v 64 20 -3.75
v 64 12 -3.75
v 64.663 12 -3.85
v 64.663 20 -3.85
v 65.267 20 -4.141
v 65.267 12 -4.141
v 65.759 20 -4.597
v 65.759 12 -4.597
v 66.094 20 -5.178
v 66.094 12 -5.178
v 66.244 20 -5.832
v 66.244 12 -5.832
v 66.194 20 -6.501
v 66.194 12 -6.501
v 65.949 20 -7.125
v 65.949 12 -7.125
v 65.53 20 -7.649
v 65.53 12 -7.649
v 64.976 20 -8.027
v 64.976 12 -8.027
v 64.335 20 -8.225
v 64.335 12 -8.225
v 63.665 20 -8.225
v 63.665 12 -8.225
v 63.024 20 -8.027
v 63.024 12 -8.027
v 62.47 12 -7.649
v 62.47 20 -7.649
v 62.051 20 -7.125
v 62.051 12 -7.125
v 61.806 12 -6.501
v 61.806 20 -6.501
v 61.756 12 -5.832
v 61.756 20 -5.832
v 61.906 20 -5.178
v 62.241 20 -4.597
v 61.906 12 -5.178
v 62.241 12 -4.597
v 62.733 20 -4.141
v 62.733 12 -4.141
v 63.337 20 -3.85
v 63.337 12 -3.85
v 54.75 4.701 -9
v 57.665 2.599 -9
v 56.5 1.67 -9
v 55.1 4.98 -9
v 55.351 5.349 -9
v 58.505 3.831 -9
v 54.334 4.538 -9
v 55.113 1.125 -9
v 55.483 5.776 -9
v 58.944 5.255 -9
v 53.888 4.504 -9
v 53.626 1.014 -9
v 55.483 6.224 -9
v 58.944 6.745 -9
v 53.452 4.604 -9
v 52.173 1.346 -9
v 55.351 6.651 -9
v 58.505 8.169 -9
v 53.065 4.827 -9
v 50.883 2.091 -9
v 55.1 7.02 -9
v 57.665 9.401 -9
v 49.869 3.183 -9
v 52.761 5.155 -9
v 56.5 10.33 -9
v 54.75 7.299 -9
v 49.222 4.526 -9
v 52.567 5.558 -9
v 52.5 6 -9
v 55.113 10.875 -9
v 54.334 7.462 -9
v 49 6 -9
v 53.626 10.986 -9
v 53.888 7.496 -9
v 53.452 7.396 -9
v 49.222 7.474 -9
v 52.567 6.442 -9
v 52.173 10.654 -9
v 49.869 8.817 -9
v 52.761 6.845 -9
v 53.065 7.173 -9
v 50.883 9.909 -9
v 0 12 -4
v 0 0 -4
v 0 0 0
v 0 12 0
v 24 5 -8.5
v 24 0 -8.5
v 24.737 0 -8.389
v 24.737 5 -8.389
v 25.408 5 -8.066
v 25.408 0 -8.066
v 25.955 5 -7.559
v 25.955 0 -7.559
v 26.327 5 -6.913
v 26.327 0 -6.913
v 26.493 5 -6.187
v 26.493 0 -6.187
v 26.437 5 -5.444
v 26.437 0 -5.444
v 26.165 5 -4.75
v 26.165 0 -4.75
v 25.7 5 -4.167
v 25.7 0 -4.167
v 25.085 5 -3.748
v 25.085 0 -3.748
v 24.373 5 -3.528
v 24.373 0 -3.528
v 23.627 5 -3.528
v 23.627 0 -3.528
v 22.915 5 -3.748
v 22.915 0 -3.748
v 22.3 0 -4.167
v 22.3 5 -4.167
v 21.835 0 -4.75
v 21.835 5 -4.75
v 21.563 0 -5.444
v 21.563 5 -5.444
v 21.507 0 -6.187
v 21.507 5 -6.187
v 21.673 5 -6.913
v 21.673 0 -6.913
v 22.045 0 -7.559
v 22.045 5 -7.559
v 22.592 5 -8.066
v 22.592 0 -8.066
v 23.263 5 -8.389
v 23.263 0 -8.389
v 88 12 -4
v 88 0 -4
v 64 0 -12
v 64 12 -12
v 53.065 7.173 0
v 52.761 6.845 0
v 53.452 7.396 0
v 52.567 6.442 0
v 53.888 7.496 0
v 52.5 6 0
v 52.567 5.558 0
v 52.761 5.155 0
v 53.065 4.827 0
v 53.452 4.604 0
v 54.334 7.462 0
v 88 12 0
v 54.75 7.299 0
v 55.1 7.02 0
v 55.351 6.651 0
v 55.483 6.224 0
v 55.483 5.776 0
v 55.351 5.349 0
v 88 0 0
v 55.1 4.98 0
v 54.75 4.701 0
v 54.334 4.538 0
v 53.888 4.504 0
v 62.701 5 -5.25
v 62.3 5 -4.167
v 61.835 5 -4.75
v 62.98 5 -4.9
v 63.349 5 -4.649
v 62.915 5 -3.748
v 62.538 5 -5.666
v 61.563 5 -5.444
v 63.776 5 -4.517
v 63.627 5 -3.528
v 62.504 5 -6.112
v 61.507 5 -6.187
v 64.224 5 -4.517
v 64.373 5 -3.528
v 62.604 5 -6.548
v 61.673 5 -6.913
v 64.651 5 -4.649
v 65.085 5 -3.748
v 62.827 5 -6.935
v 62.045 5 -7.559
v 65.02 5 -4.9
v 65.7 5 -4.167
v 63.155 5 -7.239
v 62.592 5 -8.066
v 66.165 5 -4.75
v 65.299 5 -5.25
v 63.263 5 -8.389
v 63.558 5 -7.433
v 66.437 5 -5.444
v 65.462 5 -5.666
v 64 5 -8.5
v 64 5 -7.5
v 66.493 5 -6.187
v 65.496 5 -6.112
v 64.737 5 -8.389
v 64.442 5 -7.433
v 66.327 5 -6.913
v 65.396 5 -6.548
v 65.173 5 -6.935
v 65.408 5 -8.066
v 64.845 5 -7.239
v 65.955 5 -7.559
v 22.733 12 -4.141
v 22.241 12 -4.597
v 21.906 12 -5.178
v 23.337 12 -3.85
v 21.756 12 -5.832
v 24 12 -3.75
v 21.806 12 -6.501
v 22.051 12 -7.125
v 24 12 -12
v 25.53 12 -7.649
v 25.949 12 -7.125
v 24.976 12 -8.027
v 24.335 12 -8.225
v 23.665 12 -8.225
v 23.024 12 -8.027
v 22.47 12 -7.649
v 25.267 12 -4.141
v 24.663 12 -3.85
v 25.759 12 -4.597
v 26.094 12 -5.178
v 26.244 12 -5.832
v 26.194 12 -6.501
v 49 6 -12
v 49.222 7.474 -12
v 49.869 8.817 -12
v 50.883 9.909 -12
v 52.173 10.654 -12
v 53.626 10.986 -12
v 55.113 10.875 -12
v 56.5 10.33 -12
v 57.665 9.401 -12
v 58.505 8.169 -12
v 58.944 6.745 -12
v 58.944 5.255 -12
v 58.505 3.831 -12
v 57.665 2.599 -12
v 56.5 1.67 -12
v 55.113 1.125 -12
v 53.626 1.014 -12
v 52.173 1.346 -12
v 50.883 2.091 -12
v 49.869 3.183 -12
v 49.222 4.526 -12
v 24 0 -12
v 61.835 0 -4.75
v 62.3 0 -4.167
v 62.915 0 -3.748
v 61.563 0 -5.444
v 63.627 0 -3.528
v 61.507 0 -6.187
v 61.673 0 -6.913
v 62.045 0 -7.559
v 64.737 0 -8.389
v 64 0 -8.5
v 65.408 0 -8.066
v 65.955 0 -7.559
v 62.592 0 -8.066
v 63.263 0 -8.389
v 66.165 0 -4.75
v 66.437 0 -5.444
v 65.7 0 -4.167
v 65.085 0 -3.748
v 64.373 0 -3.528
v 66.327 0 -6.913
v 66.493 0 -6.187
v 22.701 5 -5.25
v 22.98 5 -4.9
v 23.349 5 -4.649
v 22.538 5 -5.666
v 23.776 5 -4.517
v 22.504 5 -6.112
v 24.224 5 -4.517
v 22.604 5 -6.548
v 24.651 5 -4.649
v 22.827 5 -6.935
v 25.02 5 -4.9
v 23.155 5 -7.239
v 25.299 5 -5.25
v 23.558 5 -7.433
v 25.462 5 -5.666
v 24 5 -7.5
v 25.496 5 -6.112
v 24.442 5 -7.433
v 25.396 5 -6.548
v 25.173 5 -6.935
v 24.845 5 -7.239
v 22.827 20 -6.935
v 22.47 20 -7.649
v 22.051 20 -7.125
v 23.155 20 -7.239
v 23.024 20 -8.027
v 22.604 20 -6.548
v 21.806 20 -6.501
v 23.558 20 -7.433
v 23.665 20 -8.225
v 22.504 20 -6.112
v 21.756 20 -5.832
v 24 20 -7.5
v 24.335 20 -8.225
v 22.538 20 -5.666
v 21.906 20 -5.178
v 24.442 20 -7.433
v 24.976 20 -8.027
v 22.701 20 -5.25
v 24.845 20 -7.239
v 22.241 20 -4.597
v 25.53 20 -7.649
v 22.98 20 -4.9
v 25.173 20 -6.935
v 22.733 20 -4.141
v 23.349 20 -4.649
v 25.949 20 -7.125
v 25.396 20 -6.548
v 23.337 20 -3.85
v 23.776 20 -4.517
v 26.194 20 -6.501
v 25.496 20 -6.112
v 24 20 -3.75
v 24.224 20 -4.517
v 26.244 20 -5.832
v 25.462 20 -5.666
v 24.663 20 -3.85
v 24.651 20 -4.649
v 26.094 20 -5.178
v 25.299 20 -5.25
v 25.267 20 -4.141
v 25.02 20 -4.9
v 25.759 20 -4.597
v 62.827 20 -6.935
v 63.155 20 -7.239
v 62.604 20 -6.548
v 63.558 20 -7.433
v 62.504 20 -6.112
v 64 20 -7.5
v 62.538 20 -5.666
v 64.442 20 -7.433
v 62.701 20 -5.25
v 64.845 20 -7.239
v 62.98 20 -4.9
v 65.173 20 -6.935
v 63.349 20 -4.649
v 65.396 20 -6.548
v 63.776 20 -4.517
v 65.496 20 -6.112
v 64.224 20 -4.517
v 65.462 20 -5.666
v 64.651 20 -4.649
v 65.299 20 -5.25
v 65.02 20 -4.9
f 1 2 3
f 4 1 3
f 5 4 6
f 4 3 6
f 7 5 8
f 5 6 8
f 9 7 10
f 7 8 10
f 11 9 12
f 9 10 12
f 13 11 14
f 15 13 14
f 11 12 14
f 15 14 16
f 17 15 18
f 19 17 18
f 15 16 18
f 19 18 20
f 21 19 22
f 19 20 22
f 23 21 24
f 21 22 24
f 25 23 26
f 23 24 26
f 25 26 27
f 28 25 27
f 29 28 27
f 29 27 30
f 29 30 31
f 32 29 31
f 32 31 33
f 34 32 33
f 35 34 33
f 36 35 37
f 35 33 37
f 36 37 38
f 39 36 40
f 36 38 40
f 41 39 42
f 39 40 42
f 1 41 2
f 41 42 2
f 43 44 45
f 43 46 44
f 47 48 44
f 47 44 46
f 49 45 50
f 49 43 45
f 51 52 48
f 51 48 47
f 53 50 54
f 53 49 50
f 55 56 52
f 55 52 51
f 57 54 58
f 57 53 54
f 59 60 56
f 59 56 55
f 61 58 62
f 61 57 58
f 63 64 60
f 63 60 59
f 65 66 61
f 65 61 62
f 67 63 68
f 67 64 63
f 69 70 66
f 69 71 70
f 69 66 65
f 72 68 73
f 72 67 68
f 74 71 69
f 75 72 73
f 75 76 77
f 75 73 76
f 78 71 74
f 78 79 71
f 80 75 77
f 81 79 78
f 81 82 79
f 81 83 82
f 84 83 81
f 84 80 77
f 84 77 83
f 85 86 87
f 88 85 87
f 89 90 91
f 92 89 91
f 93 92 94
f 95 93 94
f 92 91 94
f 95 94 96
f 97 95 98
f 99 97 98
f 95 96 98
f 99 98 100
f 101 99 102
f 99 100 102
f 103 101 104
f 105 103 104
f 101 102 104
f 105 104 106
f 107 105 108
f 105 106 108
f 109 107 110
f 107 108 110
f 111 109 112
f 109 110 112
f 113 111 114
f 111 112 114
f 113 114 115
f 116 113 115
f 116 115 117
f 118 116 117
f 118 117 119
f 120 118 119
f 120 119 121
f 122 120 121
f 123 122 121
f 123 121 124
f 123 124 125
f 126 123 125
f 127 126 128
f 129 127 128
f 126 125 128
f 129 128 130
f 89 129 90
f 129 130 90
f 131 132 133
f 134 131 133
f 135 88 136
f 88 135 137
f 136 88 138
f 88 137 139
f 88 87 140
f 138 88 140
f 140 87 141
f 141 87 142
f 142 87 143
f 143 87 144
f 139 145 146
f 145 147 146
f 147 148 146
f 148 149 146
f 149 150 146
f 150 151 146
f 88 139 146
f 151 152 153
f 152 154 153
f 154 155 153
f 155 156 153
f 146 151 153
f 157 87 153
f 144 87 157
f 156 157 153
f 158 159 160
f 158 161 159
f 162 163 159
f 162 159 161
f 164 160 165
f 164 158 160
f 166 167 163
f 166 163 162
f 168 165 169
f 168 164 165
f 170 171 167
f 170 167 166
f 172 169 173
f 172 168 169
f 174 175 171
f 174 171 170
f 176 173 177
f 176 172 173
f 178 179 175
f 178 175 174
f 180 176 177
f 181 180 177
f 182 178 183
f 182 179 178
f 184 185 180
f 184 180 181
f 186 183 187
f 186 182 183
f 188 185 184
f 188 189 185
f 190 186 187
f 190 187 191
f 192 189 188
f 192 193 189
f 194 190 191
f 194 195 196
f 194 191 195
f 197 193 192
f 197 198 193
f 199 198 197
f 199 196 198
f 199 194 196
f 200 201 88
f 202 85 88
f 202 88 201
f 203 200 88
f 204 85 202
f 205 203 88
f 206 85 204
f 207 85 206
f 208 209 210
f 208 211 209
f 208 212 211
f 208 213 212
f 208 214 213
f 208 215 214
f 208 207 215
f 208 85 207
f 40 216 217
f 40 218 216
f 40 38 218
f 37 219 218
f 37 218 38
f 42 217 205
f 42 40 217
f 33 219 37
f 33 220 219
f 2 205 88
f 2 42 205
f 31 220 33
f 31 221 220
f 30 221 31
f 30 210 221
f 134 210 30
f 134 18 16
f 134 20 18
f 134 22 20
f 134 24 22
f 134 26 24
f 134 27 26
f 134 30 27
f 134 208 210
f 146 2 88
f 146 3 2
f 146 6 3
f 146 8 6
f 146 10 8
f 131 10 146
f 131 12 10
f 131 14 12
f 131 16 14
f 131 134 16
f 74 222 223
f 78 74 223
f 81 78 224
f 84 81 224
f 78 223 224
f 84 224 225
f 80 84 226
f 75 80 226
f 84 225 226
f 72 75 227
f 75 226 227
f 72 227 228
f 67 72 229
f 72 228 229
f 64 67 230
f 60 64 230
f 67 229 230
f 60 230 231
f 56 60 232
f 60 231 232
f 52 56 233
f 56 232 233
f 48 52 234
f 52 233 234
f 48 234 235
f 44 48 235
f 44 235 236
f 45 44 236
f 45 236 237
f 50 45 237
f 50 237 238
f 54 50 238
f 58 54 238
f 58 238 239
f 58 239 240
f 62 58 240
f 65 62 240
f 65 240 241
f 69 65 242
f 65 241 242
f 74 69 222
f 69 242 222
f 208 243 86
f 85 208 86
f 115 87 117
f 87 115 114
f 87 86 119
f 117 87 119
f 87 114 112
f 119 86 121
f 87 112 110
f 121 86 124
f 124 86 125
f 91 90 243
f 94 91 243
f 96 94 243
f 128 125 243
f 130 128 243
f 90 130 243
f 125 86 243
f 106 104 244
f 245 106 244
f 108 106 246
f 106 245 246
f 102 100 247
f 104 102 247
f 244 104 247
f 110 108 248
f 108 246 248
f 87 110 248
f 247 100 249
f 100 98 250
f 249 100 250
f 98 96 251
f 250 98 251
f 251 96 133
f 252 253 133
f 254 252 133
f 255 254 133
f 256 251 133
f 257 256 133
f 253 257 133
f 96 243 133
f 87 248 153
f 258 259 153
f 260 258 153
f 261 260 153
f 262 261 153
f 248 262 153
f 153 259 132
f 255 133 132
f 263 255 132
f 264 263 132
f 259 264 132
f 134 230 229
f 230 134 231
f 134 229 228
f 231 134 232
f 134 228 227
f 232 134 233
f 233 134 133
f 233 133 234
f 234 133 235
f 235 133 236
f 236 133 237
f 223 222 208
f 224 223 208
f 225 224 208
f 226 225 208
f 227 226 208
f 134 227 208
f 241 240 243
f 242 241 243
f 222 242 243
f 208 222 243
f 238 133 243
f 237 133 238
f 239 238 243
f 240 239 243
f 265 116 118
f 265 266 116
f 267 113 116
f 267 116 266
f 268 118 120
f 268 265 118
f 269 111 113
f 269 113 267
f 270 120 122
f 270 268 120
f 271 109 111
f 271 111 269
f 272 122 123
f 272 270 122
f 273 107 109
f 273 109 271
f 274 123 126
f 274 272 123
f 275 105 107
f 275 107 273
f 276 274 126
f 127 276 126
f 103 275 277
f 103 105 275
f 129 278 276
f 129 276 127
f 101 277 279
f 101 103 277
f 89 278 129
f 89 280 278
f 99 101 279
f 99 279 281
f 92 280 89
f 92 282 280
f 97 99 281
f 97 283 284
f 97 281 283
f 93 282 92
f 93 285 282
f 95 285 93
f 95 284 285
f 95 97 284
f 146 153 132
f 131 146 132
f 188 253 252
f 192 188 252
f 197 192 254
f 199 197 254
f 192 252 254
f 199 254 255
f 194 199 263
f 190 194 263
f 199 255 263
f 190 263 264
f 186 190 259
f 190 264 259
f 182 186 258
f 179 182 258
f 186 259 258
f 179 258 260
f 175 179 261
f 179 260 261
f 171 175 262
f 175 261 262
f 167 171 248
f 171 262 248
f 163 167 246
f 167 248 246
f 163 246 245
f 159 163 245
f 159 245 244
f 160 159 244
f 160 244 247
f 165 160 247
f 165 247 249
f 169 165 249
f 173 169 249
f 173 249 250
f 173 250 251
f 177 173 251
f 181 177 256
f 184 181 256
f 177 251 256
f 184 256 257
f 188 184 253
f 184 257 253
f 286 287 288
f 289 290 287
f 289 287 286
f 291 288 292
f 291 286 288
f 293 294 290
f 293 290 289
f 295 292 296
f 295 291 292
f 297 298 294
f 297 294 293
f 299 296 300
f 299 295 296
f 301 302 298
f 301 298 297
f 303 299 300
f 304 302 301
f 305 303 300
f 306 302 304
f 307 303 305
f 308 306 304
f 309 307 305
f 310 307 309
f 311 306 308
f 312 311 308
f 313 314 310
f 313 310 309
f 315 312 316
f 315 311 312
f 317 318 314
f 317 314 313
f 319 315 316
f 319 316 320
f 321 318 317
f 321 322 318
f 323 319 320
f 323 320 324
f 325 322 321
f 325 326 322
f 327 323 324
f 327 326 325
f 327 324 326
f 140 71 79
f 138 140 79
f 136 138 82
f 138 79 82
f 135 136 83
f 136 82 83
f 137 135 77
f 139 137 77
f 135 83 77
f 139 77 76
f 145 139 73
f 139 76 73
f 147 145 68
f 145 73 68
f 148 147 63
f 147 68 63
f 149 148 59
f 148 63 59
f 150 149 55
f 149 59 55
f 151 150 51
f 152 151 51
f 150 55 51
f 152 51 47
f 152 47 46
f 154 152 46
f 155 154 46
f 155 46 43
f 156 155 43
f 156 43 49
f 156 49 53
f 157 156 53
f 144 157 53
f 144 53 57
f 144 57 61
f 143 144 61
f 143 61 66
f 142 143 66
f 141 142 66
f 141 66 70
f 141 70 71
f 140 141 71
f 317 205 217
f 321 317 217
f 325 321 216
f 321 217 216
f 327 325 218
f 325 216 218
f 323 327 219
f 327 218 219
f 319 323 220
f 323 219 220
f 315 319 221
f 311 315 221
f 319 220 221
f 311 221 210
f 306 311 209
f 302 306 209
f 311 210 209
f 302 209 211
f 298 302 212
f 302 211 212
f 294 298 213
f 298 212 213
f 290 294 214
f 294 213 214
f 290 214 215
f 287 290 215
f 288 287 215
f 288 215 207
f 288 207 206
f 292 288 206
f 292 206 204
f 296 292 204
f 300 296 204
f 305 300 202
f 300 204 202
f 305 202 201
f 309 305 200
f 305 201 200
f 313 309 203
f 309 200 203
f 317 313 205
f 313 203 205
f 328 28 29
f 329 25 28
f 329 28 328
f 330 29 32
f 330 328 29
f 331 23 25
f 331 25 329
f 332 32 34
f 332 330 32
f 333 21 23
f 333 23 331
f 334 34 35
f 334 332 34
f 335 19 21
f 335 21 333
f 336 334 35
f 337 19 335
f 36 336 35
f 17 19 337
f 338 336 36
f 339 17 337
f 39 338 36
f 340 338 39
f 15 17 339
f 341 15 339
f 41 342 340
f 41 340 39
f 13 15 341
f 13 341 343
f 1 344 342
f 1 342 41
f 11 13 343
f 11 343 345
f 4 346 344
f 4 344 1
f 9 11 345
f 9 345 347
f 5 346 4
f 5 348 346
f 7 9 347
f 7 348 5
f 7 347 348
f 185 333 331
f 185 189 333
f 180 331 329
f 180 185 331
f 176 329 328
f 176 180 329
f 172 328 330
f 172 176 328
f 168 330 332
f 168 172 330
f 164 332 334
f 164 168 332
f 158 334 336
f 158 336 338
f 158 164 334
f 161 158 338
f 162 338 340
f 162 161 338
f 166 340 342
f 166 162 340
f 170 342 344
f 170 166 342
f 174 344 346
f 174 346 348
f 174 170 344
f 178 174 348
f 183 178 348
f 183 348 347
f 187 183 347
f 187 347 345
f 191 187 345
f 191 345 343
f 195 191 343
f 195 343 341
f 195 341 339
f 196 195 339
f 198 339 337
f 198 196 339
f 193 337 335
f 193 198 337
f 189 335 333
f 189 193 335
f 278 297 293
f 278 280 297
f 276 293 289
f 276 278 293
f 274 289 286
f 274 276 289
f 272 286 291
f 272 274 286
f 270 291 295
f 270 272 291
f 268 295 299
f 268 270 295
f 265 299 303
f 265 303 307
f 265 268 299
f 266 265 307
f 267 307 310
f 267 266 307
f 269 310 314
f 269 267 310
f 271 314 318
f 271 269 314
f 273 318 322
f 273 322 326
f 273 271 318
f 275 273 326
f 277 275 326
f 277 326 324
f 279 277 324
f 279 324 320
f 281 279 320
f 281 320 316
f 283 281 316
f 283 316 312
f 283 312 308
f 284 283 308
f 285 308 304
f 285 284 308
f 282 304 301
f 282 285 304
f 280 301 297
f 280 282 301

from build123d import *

# Parameters (mm, degrees)
BOSS_EXTRUDE1_DEPTH = 12
SKETCH2_R           = 2.5
CUT_EXTRUDE1_DEPTH  = 5
SKETCH3_R           = 1.5
CUT_EXTRUDE2_DEPTH  = 90.089842294
SKETCH4_R           = 2.25
SKETCH4_R_2         = 1.5
BOSS_EXTRUDE2_DEPTH = 8
SKETCH5_R           = 5
CUT_EXTRUDE3_DEPTH  = 3
SKETCH6_R           = 1.5
CUT_EXTRUDE4_DEPTH  = 91.691785736


with BuildPart() as part:
    # Sketch1 → Boss-Extrude1 (new body)
    with BuildSketch(Plane(origin=(0, 0, 0), x_dir=(1, 0, 0), z_dir=(0, 1, 0))):
        Polygon((0, 0), (88, 0), (88, 4), (64, 12), (24, 12), (0, 4), align=None)
    extrude(amount=BOSS_EXTRUDE1_DEPTH)

    # Sketch2 → Cut-Extrude1 (cut)
    with BuildSketch(Plane(origin=(0, 0, 0), x_dir=(-1, 0, 0), z_dir=(0, -1, 0))):
        with Locations(Location((-24, 6, 0), (0, 0, 90))):
            Circle(SKETCH2_R)
        with Locations(Location((-64, 6, 0), (0, 0, 90))):
            Circle(SKETCH2_R)
    extrude(amount=-CUT_EXTRUDE1_DEPTH, mode=Mode.SUBTRACT)

    # Sketch3 → Cut-Extrude2 (cut, through all)
    with BuildSketch(Plane(origin=(0, 5, 0), x_dir=(-1, 0, 0), z_dir=(0, -1, 0))):
        with Locations(Location((-24, 6, 0), (0, 0, 90))):
            Circle(SKETCH3_R)
        with Locations(Location((-64, 6, 0), (0, 0, 90))):
            Circle(SKETCH3_R)
    extrude(amount=-CUT_EXTRUDE2_DEPTH, mode=Mode.SUBTRACT)

    # Sketch4 → Boss-Extrude2 (add)
    with BuildSketch(Plane(origin=(0, 12, 0), x_dir=(1, 0, 0), z_dir=(0, 1, 0))):
        with Locations(Location((24, 6, 0), (0, 0, 270))):
            Circle(SKETCH4_R)
        with Locations(Location((24, 6, 0), (0, 0, 90))):
            Circle(SKETCH4_R_2, mode=Mode.SUBTRACT)
        with Locations(Location((64, 6, 0), (0, 0, 270))):
            Circle(SKETCH4_R)
        with Locations(Location((64, 6, 0), (0, 0, 90))):
            Circle(SKETCH4_R_2, mode=Mode.SUBTRACT)
    extrude(amount=BOSS_EXTRUDE2_DEPTH)

    # Sketch5 → Cut-Extrude3 (cut)
    with BuildSketch(Plane(origin=(0, 0, -12), x_dir=(-1, 0, 0), z_dir=(0, 0, -1))):
        with Locations((-54, 6)):
            Circle(SKETCH5_R)
    extrude(amount=-CUT_EXTRUDE3_DEPTH, mode=Mode.SUBTRACT)

    # Sketch6 → Cut-Extrude4 (cut, through all)
    with BuildSketch(Plane(origin=(0, 0, -9), x_dir=(-1, 0, 0), z_dir=(0, 0, -1))):
        with Locations((-54, 6)):
            Circle(SKETCH6_R)
    extrude(amount=-CUT_EXTRUDE4_DEPTH, mode=Mode.SUBTRACT)


solid = part.part
